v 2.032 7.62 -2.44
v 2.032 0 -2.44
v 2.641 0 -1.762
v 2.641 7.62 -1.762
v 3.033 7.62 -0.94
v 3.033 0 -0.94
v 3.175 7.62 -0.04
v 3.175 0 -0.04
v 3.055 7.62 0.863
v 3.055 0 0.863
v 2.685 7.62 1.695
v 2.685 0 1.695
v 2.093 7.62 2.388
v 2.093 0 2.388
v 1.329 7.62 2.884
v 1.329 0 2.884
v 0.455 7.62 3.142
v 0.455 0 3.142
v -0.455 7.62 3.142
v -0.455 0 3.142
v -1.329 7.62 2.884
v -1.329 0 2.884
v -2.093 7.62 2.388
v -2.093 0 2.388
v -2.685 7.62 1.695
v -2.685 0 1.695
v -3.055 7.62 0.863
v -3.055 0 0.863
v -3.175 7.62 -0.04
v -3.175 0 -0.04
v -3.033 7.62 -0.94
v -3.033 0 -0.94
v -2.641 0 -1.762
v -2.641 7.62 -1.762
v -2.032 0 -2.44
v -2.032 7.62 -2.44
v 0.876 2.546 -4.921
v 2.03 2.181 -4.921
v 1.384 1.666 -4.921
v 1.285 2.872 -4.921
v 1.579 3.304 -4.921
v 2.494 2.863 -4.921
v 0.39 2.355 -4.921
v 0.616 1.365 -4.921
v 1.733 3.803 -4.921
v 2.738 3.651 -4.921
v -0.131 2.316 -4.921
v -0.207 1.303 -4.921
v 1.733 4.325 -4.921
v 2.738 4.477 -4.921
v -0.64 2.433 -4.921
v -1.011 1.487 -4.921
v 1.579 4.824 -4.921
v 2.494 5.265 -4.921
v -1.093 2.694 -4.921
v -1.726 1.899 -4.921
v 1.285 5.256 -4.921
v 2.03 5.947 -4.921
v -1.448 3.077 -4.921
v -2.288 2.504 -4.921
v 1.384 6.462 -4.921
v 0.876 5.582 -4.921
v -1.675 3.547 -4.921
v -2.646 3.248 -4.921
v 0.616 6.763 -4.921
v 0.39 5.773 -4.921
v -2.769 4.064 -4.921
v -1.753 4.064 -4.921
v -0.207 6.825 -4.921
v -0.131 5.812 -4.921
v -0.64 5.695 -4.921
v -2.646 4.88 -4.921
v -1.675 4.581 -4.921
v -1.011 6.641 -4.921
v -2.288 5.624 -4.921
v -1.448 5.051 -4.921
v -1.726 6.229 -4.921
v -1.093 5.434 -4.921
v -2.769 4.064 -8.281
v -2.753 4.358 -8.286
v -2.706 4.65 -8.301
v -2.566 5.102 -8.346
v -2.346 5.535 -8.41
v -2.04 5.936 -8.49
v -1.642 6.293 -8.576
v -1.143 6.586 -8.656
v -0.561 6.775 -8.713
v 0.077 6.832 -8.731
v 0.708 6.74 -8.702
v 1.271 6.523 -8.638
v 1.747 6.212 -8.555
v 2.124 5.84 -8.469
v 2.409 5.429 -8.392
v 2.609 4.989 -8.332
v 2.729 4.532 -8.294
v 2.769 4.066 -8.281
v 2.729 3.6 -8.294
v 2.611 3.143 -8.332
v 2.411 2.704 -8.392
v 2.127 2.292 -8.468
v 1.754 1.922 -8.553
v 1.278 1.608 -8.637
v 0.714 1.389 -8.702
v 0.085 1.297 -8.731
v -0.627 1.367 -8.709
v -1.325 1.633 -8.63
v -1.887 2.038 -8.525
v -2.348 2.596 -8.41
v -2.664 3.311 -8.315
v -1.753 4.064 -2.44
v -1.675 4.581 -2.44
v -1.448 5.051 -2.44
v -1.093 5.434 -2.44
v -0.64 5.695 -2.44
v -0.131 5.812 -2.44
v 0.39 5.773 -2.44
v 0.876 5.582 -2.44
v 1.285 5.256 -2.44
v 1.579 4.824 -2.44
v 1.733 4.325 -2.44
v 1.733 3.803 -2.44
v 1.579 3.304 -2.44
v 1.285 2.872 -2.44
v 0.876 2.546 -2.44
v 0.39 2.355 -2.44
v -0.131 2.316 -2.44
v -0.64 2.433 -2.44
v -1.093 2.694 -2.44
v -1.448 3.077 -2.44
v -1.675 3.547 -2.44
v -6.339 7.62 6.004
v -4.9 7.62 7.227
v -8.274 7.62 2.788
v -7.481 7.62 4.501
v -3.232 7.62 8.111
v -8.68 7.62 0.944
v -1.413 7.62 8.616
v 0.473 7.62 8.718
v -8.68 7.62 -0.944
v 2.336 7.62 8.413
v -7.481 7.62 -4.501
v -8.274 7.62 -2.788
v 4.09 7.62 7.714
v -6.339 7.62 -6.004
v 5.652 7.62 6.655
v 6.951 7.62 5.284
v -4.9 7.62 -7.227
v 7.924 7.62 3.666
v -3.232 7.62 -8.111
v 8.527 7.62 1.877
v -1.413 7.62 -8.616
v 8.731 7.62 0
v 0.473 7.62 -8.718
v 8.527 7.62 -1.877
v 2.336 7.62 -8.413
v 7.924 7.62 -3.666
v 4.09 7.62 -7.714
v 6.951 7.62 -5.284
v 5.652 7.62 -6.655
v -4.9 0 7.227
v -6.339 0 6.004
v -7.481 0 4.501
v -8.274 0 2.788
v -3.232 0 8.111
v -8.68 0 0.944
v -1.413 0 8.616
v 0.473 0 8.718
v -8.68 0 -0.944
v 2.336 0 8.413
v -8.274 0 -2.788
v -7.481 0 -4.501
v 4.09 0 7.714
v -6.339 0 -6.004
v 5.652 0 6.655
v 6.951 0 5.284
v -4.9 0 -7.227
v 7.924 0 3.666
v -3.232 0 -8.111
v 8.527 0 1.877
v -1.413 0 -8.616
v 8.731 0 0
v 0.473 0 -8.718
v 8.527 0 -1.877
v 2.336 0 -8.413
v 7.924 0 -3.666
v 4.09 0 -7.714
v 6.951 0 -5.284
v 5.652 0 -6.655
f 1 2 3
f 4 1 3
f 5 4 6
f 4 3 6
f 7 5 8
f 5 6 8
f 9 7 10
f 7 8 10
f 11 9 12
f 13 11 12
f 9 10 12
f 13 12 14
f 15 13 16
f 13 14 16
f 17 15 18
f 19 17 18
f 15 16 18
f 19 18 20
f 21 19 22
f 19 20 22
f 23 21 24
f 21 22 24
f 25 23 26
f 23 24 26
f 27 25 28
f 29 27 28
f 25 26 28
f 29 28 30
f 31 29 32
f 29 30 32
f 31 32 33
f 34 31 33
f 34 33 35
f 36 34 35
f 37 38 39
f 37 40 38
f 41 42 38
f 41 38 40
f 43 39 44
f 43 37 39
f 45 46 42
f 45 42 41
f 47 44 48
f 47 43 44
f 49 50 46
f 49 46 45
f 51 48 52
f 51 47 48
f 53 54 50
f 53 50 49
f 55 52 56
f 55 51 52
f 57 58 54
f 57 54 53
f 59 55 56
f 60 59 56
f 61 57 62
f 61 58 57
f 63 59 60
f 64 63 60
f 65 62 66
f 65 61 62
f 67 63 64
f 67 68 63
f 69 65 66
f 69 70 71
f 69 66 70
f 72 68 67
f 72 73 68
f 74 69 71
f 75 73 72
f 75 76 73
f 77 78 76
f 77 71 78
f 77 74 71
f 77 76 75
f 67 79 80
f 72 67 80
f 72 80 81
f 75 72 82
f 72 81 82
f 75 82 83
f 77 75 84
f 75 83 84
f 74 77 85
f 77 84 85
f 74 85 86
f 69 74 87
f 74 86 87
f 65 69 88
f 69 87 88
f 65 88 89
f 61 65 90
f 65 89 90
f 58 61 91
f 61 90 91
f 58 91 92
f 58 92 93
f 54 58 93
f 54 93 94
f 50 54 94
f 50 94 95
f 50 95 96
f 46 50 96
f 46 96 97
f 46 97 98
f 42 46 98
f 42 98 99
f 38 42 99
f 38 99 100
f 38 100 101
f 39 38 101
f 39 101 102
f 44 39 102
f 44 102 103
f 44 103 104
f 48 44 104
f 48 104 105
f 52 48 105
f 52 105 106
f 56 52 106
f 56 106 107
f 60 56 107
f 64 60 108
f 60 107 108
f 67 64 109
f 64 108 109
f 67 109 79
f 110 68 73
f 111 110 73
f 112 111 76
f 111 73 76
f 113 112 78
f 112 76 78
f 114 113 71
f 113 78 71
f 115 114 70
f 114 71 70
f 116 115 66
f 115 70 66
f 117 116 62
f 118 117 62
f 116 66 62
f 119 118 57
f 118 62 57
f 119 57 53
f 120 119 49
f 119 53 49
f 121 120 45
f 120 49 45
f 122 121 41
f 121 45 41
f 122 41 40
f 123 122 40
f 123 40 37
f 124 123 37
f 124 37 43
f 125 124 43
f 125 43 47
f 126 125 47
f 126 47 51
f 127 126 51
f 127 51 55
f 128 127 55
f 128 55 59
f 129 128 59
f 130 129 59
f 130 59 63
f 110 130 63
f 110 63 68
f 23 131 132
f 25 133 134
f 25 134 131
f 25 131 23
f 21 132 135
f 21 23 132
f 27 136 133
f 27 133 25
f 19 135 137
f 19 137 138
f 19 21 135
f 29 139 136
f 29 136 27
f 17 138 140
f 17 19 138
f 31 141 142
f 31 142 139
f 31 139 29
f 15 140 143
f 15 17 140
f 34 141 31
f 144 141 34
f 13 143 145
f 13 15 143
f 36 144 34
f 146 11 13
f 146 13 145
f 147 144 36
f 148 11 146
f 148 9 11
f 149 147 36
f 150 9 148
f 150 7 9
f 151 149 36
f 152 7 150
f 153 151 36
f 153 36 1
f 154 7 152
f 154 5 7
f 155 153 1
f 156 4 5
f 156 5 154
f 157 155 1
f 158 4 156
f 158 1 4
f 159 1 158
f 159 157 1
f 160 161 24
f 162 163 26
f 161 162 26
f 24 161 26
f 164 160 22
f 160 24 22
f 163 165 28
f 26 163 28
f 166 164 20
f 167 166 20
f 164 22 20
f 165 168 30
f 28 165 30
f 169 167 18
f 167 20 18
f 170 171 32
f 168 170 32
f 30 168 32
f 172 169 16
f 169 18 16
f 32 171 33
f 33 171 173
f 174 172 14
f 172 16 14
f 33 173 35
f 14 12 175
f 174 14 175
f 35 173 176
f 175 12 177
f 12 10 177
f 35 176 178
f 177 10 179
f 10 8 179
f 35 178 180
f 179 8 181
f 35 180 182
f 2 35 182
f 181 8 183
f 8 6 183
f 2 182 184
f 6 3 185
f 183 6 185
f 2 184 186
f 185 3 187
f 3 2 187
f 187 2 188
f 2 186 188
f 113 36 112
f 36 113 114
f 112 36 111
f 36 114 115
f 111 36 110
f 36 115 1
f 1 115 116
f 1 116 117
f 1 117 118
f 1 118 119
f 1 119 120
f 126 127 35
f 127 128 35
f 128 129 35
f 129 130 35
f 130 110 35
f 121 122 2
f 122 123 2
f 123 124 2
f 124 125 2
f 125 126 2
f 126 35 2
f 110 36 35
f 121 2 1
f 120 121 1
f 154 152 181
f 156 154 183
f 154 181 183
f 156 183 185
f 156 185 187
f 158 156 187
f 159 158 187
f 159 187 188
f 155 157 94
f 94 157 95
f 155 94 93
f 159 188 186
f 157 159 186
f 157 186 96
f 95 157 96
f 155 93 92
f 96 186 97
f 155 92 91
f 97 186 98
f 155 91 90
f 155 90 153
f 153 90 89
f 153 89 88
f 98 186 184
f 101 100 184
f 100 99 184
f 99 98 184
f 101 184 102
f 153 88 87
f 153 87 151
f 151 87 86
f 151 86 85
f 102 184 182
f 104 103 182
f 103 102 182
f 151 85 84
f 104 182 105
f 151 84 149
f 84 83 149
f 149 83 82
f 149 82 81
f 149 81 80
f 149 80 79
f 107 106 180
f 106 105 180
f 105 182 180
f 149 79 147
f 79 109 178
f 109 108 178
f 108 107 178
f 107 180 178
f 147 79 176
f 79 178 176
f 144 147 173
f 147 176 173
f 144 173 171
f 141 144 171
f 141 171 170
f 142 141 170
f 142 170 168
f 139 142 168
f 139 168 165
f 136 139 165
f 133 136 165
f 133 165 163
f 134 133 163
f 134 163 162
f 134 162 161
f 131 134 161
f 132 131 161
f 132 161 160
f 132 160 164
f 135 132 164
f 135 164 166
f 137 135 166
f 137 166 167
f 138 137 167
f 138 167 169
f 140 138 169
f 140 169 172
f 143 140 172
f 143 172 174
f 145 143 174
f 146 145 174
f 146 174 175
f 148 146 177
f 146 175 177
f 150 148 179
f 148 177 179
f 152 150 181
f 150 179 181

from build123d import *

# Parameters (mm, degrees)
SKETCH1_R           = 8.73125
BOSS_EXTRUDE1_DEPTH = 7.62
SKETCH2_R           = 2.7686
CUT_EXTRUDE1_DEPTH  = 3.81
CUT_EXTRUDE2_REACH  = 15.653
SKETCH3_R           = 1.7526


with BuildPart() as part:
    # Sketch1 → Boss-Extrude1 (new body)
    with BuildSketch(Plane(origin=(0, 0, 0), x_dir=(1, 0, 0), z_dir=(0, 1, 0))):
        Circle(SKETCH1_R)
        with BuildLine():
            Line((-2.032, 2.439590334), (2.032, 2.439590334))
            ThreePointArc((2.032, 2.439590334), (0, -3.175), (-2.032, 2.439590334))
        make_face(mode=Mode.SUBTRACT)
    extrude(amount=BOSS_EXTRUDE1_DEPTH)

    # Sketch2 → Cut-Extrude1 (cut)
    with BuildSketch(Plane(origin=(0, 0, -8.73125), x_dir=(-1, 0, 0), z_dir=(0, 0, -1))):
        with Locations((0, 4.064)):
            Circle(SKETCH2_R)
    extrude(amount=-CUT_EXTRUDE1_DEPTH, mode=Mode.SUBTRACT)

    # Sketch3 → Cut-Extrude2 (cut, up to next)
    with BuildSketch(Plane(origin=(0, 0, -4.92125), x_dir=(-1, 0, 0), z_dir=(0, 0, -1)), mode=Mode.PRIVATE) as cut_extrude2_sk1:
        with Locations((0, 4.064)):
            Circle(SKETCH3_R)
    cut_extrude2_tool1 = extrude(cut_extrude2_sk1.sketch, amount=-CUT_EXTRUDE2_REACH, mode=Mode.PRIVATE) & part.part
    add(cut_extrude2_tool1.solids().sort_by_distance((0, 4.064, -4.92125))[0], mode=Mode.SUBTRACT)


solid = part.part
